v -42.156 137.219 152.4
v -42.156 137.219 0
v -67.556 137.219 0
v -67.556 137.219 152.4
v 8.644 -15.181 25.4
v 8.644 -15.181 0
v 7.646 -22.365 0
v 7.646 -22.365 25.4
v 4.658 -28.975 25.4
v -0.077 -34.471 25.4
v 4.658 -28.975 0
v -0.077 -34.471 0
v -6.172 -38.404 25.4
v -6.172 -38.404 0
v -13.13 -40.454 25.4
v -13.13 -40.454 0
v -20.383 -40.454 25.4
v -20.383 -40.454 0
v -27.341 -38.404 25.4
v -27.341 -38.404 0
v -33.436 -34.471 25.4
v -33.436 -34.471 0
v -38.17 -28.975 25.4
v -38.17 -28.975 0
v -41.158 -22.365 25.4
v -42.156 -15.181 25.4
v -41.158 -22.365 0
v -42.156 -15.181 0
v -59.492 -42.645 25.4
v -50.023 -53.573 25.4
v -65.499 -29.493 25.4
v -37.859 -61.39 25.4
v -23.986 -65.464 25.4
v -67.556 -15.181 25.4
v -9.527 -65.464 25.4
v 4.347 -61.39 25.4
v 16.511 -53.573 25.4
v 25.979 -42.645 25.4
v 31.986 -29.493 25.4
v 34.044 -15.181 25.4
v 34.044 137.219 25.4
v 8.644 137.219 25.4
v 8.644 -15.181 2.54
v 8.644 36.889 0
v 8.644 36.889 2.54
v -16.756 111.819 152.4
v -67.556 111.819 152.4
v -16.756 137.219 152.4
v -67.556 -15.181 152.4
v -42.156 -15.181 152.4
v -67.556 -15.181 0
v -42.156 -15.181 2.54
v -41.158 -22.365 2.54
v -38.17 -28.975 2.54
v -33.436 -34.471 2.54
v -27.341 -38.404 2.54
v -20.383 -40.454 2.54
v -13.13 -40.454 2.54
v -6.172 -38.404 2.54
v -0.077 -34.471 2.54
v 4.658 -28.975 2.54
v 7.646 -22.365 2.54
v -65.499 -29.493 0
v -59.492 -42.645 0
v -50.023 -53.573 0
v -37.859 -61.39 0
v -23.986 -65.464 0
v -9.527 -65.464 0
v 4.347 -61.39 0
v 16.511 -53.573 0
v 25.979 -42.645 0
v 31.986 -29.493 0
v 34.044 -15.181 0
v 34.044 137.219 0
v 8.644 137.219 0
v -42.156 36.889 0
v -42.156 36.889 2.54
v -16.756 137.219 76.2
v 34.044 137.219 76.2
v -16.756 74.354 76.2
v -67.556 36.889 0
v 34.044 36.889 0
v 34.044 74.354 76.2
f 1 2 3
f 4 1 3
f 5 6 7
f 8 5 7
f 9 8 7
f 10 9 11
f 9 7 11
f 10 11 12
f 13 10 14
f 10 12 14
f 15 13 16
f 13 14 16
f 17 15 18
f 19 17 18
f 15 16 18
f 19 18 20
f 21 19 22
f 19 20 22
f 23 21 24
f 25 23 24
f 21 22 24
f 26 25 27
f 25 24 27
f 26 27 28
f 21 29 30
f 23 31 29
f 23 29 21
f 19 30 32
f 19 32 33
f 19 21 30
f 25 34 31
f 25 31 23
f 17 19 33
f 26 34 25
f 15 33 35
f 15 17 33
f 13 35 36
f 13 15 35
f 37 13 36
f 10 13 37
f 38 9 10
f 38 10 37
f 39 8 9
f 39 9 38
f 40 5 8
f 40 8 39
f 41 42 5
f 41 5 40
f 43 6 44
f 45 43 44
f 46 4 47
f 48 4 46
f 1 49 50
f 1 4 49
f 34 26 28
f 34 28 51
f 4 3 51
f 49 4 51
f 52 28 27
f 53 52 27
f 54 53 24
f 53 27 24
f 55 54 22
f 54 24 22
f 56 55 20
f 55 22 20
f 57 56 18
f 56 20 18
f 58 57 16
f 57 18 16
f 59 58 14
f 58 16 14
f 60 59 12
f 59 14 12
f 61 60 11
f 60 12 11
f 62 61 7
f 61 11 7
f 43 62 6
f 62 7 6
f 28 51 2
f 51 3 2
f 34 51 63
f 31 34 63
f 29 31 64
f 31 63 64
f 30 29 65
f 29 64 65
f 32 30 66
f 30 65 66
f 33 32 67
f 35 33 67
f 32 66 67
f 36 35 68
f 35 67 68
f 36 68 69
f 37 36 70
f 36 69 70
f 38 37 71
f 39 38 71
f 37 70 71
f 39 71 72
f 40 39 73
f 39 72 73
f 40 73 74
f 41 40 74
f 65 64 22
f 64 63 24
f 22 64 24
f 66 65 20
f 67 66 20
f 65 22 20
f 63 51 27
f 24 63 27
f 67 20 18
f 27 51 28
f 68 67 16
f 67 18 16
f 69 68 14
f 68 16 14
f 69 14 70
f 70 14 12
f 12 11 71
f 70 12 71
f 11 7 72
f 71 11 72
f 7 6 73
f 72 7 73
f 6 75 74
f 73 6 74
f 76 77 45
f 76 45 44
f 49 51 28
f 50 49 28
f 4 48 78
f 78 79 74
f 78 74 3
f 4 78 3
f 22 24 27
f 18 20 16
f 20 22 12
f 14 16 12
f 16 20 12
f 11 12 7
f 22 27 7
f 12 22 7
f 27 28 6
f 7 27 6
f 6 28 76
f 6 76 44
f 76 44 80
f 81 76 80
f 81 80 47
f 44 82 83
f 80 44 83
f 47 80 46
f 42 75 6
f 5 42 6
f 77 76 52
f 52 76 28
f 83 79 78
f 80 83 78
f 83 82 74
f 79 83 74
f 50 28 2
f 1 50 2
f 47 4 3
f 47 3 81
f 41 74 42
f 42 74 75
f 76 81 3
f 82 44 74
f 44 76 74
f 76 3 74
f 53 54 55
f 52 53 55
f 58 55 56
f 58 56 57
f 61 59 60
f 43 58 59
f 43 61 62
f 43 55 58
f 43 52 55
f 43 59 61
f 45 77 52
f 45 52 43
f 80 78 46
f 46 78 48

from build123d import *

# Parameters (mm, degrees)
F0_W     = 50.8
F0_H     = 7.2625415075
F1_DEPTH = 2.54
F0_W_2   = 25.4
F0_H_2   = 25.4
F2_DEPTH = 152.4
F4_DEPTH = 101.6
F5_W     = 50.8
F5_H     = 76.2
F6_DEPTH = 63.5
F0_H_3   = 52.07
F7_DEPTH = 152.4
F8_DEPTH = 25.4


with BuildPart() as f1:
    # F0 (on Top) → F1 (new body)
    with BuildSketch(Plane.XY):
        with BuildLine():
            Line((8.6435877442, 36.8893793178), (-42.1564122558, 36.8893793178))
            Line((-42.1564122558, 36.8893793178), (-42.1564122558, -15.1806206822))
            ThreePointArc((-42.1564122558, -15.1806206822), (-16.7564122558, -40.7145502088), (8.6435877442, -15.1806206822))
            Line((8.6435877442, -15.1806206822), (8.6435877442, 36.8893793178))
        make_face()
        with Locations((-16.7564122558, 40.5206500715)):
            Rectangle(F0_W, F0_H)
    extrude(amount=F1_DEPTH)

    # F0 (on Top) → F2 (join)
    with BuildSketch(Plane.XY):
        Polygon((34.0435877442, 137.2193793178), (8.6435877442, 137.2193793178), (8.6435877442, 44.1519208252), (8.6435877442, 36.8893793178), (34.0435877442, 36.8893793178), align=None)
        Polygon((8.6435877442, 137.2193793178), (-16.7564122558, 137.2193793178), (-16.7564122558, 111.8193793178), (-42.1564122558, 111.8193793178), (-42.1564122558, 44.1519208252), (8.6435877442, 44.1519208252), align=None)
        with Locations((-29.4564122558, 124.5193793178)):
            Rectangle(F0_W_2, F0_H_2)
        Polygon((-42.1564122558, 137.2193793178), (-67.5564122558, 137.2193793178), (-67.5564122558, 36.8893793178), (-42.1564122558, 36.8893793178), (-42.1564122558, 44.1519208252), (-42.1564122558, 111.8193793178), align=None)
        with Locations((-16.7564122558, 40.5206500715)):
            Rectangle(F0_W, F0_H)
    extrude(amount=F2_DEPTH)

    # F3 (on face) → F4 (cut)
    with BuildSketch(Plane.YZ.offset(34.0435877442)):
        Polygon((36.8893793178, 0), (111.8193793178, 152.4), (36.8893793178, 152.4), align=None)
    extrude(amount=-F4_DEPTH, mode=Mode.SUBTRACT)

    # F5 (on face) → F6 (cut)
    with BuildSketch(Plane(origin=(0, 137.2193793178, 0), x_dir=(-1, 0, 0), z_dir=(0, 1, 0))):
        with Locations((-8.6435877442, 114.3)):
            Rectangle(F5_W, F5_H)
    extrude(amount=-F6_DEPTH, mode=Mode.SUBTRACT)


with BuildPart() as f7:
    # F0 (on Top) → F7 (new body)
    with BuildSketch(Plane.XY):
        with Locations((-54.8564122558, 10.8543793178)):
            Rectangle(F0_W_2, F0_H_3)
        Polygon((-42.1564122558, 137.2193793178), (-67.5564122558, 137.2193793178), (-67.5564122558, 36.8893793178), (-42.1564122558, 36.8893793178), (-42.1564122558, 44.1519208252), (-42.1564122558, 111.8193793178), align=None)
    extrude(amount=F7_DEPTH)


with BuildPart() as f8:
    # F0 (on Top) → F8 (new body)
    with BuildSketch(Plane.XY):
        with BuildLine():
            Line((-42.1564122558, -15.1806206822), (-67.5564122558, -15.1806206822))
            ThreePointArc((-67.5564122558, -15.1806206822), (-16.7564122558, -65.9806206822), (34.0435877442, -15.1806206822))
            Line((34.0435877442, -15.1806206822), (8.6435877442, -15.1806206822))
            ThreePointArc((8.6435877442, -15.1806206822), (-16.7564122558, -40.7145502088), (-42.1564122558, -15.1806206822))
        make_face()
        with Locations((21.3435877442, 10.8543793178)):
            Rectangle(F0_W_2, F0_H_3)
        Polygon((34.0435877442, 137.2193793178), (8.6435877442, 137.2193793178), (8.6435877442, 44.1519208252), (8.6435877442, 36.8893793178), (34.0435877442, 36.8893793178), align=None)
    extrude(amount=F8_DEPTH)


solid = Compound([f1.part, f7.part, f8.part])
